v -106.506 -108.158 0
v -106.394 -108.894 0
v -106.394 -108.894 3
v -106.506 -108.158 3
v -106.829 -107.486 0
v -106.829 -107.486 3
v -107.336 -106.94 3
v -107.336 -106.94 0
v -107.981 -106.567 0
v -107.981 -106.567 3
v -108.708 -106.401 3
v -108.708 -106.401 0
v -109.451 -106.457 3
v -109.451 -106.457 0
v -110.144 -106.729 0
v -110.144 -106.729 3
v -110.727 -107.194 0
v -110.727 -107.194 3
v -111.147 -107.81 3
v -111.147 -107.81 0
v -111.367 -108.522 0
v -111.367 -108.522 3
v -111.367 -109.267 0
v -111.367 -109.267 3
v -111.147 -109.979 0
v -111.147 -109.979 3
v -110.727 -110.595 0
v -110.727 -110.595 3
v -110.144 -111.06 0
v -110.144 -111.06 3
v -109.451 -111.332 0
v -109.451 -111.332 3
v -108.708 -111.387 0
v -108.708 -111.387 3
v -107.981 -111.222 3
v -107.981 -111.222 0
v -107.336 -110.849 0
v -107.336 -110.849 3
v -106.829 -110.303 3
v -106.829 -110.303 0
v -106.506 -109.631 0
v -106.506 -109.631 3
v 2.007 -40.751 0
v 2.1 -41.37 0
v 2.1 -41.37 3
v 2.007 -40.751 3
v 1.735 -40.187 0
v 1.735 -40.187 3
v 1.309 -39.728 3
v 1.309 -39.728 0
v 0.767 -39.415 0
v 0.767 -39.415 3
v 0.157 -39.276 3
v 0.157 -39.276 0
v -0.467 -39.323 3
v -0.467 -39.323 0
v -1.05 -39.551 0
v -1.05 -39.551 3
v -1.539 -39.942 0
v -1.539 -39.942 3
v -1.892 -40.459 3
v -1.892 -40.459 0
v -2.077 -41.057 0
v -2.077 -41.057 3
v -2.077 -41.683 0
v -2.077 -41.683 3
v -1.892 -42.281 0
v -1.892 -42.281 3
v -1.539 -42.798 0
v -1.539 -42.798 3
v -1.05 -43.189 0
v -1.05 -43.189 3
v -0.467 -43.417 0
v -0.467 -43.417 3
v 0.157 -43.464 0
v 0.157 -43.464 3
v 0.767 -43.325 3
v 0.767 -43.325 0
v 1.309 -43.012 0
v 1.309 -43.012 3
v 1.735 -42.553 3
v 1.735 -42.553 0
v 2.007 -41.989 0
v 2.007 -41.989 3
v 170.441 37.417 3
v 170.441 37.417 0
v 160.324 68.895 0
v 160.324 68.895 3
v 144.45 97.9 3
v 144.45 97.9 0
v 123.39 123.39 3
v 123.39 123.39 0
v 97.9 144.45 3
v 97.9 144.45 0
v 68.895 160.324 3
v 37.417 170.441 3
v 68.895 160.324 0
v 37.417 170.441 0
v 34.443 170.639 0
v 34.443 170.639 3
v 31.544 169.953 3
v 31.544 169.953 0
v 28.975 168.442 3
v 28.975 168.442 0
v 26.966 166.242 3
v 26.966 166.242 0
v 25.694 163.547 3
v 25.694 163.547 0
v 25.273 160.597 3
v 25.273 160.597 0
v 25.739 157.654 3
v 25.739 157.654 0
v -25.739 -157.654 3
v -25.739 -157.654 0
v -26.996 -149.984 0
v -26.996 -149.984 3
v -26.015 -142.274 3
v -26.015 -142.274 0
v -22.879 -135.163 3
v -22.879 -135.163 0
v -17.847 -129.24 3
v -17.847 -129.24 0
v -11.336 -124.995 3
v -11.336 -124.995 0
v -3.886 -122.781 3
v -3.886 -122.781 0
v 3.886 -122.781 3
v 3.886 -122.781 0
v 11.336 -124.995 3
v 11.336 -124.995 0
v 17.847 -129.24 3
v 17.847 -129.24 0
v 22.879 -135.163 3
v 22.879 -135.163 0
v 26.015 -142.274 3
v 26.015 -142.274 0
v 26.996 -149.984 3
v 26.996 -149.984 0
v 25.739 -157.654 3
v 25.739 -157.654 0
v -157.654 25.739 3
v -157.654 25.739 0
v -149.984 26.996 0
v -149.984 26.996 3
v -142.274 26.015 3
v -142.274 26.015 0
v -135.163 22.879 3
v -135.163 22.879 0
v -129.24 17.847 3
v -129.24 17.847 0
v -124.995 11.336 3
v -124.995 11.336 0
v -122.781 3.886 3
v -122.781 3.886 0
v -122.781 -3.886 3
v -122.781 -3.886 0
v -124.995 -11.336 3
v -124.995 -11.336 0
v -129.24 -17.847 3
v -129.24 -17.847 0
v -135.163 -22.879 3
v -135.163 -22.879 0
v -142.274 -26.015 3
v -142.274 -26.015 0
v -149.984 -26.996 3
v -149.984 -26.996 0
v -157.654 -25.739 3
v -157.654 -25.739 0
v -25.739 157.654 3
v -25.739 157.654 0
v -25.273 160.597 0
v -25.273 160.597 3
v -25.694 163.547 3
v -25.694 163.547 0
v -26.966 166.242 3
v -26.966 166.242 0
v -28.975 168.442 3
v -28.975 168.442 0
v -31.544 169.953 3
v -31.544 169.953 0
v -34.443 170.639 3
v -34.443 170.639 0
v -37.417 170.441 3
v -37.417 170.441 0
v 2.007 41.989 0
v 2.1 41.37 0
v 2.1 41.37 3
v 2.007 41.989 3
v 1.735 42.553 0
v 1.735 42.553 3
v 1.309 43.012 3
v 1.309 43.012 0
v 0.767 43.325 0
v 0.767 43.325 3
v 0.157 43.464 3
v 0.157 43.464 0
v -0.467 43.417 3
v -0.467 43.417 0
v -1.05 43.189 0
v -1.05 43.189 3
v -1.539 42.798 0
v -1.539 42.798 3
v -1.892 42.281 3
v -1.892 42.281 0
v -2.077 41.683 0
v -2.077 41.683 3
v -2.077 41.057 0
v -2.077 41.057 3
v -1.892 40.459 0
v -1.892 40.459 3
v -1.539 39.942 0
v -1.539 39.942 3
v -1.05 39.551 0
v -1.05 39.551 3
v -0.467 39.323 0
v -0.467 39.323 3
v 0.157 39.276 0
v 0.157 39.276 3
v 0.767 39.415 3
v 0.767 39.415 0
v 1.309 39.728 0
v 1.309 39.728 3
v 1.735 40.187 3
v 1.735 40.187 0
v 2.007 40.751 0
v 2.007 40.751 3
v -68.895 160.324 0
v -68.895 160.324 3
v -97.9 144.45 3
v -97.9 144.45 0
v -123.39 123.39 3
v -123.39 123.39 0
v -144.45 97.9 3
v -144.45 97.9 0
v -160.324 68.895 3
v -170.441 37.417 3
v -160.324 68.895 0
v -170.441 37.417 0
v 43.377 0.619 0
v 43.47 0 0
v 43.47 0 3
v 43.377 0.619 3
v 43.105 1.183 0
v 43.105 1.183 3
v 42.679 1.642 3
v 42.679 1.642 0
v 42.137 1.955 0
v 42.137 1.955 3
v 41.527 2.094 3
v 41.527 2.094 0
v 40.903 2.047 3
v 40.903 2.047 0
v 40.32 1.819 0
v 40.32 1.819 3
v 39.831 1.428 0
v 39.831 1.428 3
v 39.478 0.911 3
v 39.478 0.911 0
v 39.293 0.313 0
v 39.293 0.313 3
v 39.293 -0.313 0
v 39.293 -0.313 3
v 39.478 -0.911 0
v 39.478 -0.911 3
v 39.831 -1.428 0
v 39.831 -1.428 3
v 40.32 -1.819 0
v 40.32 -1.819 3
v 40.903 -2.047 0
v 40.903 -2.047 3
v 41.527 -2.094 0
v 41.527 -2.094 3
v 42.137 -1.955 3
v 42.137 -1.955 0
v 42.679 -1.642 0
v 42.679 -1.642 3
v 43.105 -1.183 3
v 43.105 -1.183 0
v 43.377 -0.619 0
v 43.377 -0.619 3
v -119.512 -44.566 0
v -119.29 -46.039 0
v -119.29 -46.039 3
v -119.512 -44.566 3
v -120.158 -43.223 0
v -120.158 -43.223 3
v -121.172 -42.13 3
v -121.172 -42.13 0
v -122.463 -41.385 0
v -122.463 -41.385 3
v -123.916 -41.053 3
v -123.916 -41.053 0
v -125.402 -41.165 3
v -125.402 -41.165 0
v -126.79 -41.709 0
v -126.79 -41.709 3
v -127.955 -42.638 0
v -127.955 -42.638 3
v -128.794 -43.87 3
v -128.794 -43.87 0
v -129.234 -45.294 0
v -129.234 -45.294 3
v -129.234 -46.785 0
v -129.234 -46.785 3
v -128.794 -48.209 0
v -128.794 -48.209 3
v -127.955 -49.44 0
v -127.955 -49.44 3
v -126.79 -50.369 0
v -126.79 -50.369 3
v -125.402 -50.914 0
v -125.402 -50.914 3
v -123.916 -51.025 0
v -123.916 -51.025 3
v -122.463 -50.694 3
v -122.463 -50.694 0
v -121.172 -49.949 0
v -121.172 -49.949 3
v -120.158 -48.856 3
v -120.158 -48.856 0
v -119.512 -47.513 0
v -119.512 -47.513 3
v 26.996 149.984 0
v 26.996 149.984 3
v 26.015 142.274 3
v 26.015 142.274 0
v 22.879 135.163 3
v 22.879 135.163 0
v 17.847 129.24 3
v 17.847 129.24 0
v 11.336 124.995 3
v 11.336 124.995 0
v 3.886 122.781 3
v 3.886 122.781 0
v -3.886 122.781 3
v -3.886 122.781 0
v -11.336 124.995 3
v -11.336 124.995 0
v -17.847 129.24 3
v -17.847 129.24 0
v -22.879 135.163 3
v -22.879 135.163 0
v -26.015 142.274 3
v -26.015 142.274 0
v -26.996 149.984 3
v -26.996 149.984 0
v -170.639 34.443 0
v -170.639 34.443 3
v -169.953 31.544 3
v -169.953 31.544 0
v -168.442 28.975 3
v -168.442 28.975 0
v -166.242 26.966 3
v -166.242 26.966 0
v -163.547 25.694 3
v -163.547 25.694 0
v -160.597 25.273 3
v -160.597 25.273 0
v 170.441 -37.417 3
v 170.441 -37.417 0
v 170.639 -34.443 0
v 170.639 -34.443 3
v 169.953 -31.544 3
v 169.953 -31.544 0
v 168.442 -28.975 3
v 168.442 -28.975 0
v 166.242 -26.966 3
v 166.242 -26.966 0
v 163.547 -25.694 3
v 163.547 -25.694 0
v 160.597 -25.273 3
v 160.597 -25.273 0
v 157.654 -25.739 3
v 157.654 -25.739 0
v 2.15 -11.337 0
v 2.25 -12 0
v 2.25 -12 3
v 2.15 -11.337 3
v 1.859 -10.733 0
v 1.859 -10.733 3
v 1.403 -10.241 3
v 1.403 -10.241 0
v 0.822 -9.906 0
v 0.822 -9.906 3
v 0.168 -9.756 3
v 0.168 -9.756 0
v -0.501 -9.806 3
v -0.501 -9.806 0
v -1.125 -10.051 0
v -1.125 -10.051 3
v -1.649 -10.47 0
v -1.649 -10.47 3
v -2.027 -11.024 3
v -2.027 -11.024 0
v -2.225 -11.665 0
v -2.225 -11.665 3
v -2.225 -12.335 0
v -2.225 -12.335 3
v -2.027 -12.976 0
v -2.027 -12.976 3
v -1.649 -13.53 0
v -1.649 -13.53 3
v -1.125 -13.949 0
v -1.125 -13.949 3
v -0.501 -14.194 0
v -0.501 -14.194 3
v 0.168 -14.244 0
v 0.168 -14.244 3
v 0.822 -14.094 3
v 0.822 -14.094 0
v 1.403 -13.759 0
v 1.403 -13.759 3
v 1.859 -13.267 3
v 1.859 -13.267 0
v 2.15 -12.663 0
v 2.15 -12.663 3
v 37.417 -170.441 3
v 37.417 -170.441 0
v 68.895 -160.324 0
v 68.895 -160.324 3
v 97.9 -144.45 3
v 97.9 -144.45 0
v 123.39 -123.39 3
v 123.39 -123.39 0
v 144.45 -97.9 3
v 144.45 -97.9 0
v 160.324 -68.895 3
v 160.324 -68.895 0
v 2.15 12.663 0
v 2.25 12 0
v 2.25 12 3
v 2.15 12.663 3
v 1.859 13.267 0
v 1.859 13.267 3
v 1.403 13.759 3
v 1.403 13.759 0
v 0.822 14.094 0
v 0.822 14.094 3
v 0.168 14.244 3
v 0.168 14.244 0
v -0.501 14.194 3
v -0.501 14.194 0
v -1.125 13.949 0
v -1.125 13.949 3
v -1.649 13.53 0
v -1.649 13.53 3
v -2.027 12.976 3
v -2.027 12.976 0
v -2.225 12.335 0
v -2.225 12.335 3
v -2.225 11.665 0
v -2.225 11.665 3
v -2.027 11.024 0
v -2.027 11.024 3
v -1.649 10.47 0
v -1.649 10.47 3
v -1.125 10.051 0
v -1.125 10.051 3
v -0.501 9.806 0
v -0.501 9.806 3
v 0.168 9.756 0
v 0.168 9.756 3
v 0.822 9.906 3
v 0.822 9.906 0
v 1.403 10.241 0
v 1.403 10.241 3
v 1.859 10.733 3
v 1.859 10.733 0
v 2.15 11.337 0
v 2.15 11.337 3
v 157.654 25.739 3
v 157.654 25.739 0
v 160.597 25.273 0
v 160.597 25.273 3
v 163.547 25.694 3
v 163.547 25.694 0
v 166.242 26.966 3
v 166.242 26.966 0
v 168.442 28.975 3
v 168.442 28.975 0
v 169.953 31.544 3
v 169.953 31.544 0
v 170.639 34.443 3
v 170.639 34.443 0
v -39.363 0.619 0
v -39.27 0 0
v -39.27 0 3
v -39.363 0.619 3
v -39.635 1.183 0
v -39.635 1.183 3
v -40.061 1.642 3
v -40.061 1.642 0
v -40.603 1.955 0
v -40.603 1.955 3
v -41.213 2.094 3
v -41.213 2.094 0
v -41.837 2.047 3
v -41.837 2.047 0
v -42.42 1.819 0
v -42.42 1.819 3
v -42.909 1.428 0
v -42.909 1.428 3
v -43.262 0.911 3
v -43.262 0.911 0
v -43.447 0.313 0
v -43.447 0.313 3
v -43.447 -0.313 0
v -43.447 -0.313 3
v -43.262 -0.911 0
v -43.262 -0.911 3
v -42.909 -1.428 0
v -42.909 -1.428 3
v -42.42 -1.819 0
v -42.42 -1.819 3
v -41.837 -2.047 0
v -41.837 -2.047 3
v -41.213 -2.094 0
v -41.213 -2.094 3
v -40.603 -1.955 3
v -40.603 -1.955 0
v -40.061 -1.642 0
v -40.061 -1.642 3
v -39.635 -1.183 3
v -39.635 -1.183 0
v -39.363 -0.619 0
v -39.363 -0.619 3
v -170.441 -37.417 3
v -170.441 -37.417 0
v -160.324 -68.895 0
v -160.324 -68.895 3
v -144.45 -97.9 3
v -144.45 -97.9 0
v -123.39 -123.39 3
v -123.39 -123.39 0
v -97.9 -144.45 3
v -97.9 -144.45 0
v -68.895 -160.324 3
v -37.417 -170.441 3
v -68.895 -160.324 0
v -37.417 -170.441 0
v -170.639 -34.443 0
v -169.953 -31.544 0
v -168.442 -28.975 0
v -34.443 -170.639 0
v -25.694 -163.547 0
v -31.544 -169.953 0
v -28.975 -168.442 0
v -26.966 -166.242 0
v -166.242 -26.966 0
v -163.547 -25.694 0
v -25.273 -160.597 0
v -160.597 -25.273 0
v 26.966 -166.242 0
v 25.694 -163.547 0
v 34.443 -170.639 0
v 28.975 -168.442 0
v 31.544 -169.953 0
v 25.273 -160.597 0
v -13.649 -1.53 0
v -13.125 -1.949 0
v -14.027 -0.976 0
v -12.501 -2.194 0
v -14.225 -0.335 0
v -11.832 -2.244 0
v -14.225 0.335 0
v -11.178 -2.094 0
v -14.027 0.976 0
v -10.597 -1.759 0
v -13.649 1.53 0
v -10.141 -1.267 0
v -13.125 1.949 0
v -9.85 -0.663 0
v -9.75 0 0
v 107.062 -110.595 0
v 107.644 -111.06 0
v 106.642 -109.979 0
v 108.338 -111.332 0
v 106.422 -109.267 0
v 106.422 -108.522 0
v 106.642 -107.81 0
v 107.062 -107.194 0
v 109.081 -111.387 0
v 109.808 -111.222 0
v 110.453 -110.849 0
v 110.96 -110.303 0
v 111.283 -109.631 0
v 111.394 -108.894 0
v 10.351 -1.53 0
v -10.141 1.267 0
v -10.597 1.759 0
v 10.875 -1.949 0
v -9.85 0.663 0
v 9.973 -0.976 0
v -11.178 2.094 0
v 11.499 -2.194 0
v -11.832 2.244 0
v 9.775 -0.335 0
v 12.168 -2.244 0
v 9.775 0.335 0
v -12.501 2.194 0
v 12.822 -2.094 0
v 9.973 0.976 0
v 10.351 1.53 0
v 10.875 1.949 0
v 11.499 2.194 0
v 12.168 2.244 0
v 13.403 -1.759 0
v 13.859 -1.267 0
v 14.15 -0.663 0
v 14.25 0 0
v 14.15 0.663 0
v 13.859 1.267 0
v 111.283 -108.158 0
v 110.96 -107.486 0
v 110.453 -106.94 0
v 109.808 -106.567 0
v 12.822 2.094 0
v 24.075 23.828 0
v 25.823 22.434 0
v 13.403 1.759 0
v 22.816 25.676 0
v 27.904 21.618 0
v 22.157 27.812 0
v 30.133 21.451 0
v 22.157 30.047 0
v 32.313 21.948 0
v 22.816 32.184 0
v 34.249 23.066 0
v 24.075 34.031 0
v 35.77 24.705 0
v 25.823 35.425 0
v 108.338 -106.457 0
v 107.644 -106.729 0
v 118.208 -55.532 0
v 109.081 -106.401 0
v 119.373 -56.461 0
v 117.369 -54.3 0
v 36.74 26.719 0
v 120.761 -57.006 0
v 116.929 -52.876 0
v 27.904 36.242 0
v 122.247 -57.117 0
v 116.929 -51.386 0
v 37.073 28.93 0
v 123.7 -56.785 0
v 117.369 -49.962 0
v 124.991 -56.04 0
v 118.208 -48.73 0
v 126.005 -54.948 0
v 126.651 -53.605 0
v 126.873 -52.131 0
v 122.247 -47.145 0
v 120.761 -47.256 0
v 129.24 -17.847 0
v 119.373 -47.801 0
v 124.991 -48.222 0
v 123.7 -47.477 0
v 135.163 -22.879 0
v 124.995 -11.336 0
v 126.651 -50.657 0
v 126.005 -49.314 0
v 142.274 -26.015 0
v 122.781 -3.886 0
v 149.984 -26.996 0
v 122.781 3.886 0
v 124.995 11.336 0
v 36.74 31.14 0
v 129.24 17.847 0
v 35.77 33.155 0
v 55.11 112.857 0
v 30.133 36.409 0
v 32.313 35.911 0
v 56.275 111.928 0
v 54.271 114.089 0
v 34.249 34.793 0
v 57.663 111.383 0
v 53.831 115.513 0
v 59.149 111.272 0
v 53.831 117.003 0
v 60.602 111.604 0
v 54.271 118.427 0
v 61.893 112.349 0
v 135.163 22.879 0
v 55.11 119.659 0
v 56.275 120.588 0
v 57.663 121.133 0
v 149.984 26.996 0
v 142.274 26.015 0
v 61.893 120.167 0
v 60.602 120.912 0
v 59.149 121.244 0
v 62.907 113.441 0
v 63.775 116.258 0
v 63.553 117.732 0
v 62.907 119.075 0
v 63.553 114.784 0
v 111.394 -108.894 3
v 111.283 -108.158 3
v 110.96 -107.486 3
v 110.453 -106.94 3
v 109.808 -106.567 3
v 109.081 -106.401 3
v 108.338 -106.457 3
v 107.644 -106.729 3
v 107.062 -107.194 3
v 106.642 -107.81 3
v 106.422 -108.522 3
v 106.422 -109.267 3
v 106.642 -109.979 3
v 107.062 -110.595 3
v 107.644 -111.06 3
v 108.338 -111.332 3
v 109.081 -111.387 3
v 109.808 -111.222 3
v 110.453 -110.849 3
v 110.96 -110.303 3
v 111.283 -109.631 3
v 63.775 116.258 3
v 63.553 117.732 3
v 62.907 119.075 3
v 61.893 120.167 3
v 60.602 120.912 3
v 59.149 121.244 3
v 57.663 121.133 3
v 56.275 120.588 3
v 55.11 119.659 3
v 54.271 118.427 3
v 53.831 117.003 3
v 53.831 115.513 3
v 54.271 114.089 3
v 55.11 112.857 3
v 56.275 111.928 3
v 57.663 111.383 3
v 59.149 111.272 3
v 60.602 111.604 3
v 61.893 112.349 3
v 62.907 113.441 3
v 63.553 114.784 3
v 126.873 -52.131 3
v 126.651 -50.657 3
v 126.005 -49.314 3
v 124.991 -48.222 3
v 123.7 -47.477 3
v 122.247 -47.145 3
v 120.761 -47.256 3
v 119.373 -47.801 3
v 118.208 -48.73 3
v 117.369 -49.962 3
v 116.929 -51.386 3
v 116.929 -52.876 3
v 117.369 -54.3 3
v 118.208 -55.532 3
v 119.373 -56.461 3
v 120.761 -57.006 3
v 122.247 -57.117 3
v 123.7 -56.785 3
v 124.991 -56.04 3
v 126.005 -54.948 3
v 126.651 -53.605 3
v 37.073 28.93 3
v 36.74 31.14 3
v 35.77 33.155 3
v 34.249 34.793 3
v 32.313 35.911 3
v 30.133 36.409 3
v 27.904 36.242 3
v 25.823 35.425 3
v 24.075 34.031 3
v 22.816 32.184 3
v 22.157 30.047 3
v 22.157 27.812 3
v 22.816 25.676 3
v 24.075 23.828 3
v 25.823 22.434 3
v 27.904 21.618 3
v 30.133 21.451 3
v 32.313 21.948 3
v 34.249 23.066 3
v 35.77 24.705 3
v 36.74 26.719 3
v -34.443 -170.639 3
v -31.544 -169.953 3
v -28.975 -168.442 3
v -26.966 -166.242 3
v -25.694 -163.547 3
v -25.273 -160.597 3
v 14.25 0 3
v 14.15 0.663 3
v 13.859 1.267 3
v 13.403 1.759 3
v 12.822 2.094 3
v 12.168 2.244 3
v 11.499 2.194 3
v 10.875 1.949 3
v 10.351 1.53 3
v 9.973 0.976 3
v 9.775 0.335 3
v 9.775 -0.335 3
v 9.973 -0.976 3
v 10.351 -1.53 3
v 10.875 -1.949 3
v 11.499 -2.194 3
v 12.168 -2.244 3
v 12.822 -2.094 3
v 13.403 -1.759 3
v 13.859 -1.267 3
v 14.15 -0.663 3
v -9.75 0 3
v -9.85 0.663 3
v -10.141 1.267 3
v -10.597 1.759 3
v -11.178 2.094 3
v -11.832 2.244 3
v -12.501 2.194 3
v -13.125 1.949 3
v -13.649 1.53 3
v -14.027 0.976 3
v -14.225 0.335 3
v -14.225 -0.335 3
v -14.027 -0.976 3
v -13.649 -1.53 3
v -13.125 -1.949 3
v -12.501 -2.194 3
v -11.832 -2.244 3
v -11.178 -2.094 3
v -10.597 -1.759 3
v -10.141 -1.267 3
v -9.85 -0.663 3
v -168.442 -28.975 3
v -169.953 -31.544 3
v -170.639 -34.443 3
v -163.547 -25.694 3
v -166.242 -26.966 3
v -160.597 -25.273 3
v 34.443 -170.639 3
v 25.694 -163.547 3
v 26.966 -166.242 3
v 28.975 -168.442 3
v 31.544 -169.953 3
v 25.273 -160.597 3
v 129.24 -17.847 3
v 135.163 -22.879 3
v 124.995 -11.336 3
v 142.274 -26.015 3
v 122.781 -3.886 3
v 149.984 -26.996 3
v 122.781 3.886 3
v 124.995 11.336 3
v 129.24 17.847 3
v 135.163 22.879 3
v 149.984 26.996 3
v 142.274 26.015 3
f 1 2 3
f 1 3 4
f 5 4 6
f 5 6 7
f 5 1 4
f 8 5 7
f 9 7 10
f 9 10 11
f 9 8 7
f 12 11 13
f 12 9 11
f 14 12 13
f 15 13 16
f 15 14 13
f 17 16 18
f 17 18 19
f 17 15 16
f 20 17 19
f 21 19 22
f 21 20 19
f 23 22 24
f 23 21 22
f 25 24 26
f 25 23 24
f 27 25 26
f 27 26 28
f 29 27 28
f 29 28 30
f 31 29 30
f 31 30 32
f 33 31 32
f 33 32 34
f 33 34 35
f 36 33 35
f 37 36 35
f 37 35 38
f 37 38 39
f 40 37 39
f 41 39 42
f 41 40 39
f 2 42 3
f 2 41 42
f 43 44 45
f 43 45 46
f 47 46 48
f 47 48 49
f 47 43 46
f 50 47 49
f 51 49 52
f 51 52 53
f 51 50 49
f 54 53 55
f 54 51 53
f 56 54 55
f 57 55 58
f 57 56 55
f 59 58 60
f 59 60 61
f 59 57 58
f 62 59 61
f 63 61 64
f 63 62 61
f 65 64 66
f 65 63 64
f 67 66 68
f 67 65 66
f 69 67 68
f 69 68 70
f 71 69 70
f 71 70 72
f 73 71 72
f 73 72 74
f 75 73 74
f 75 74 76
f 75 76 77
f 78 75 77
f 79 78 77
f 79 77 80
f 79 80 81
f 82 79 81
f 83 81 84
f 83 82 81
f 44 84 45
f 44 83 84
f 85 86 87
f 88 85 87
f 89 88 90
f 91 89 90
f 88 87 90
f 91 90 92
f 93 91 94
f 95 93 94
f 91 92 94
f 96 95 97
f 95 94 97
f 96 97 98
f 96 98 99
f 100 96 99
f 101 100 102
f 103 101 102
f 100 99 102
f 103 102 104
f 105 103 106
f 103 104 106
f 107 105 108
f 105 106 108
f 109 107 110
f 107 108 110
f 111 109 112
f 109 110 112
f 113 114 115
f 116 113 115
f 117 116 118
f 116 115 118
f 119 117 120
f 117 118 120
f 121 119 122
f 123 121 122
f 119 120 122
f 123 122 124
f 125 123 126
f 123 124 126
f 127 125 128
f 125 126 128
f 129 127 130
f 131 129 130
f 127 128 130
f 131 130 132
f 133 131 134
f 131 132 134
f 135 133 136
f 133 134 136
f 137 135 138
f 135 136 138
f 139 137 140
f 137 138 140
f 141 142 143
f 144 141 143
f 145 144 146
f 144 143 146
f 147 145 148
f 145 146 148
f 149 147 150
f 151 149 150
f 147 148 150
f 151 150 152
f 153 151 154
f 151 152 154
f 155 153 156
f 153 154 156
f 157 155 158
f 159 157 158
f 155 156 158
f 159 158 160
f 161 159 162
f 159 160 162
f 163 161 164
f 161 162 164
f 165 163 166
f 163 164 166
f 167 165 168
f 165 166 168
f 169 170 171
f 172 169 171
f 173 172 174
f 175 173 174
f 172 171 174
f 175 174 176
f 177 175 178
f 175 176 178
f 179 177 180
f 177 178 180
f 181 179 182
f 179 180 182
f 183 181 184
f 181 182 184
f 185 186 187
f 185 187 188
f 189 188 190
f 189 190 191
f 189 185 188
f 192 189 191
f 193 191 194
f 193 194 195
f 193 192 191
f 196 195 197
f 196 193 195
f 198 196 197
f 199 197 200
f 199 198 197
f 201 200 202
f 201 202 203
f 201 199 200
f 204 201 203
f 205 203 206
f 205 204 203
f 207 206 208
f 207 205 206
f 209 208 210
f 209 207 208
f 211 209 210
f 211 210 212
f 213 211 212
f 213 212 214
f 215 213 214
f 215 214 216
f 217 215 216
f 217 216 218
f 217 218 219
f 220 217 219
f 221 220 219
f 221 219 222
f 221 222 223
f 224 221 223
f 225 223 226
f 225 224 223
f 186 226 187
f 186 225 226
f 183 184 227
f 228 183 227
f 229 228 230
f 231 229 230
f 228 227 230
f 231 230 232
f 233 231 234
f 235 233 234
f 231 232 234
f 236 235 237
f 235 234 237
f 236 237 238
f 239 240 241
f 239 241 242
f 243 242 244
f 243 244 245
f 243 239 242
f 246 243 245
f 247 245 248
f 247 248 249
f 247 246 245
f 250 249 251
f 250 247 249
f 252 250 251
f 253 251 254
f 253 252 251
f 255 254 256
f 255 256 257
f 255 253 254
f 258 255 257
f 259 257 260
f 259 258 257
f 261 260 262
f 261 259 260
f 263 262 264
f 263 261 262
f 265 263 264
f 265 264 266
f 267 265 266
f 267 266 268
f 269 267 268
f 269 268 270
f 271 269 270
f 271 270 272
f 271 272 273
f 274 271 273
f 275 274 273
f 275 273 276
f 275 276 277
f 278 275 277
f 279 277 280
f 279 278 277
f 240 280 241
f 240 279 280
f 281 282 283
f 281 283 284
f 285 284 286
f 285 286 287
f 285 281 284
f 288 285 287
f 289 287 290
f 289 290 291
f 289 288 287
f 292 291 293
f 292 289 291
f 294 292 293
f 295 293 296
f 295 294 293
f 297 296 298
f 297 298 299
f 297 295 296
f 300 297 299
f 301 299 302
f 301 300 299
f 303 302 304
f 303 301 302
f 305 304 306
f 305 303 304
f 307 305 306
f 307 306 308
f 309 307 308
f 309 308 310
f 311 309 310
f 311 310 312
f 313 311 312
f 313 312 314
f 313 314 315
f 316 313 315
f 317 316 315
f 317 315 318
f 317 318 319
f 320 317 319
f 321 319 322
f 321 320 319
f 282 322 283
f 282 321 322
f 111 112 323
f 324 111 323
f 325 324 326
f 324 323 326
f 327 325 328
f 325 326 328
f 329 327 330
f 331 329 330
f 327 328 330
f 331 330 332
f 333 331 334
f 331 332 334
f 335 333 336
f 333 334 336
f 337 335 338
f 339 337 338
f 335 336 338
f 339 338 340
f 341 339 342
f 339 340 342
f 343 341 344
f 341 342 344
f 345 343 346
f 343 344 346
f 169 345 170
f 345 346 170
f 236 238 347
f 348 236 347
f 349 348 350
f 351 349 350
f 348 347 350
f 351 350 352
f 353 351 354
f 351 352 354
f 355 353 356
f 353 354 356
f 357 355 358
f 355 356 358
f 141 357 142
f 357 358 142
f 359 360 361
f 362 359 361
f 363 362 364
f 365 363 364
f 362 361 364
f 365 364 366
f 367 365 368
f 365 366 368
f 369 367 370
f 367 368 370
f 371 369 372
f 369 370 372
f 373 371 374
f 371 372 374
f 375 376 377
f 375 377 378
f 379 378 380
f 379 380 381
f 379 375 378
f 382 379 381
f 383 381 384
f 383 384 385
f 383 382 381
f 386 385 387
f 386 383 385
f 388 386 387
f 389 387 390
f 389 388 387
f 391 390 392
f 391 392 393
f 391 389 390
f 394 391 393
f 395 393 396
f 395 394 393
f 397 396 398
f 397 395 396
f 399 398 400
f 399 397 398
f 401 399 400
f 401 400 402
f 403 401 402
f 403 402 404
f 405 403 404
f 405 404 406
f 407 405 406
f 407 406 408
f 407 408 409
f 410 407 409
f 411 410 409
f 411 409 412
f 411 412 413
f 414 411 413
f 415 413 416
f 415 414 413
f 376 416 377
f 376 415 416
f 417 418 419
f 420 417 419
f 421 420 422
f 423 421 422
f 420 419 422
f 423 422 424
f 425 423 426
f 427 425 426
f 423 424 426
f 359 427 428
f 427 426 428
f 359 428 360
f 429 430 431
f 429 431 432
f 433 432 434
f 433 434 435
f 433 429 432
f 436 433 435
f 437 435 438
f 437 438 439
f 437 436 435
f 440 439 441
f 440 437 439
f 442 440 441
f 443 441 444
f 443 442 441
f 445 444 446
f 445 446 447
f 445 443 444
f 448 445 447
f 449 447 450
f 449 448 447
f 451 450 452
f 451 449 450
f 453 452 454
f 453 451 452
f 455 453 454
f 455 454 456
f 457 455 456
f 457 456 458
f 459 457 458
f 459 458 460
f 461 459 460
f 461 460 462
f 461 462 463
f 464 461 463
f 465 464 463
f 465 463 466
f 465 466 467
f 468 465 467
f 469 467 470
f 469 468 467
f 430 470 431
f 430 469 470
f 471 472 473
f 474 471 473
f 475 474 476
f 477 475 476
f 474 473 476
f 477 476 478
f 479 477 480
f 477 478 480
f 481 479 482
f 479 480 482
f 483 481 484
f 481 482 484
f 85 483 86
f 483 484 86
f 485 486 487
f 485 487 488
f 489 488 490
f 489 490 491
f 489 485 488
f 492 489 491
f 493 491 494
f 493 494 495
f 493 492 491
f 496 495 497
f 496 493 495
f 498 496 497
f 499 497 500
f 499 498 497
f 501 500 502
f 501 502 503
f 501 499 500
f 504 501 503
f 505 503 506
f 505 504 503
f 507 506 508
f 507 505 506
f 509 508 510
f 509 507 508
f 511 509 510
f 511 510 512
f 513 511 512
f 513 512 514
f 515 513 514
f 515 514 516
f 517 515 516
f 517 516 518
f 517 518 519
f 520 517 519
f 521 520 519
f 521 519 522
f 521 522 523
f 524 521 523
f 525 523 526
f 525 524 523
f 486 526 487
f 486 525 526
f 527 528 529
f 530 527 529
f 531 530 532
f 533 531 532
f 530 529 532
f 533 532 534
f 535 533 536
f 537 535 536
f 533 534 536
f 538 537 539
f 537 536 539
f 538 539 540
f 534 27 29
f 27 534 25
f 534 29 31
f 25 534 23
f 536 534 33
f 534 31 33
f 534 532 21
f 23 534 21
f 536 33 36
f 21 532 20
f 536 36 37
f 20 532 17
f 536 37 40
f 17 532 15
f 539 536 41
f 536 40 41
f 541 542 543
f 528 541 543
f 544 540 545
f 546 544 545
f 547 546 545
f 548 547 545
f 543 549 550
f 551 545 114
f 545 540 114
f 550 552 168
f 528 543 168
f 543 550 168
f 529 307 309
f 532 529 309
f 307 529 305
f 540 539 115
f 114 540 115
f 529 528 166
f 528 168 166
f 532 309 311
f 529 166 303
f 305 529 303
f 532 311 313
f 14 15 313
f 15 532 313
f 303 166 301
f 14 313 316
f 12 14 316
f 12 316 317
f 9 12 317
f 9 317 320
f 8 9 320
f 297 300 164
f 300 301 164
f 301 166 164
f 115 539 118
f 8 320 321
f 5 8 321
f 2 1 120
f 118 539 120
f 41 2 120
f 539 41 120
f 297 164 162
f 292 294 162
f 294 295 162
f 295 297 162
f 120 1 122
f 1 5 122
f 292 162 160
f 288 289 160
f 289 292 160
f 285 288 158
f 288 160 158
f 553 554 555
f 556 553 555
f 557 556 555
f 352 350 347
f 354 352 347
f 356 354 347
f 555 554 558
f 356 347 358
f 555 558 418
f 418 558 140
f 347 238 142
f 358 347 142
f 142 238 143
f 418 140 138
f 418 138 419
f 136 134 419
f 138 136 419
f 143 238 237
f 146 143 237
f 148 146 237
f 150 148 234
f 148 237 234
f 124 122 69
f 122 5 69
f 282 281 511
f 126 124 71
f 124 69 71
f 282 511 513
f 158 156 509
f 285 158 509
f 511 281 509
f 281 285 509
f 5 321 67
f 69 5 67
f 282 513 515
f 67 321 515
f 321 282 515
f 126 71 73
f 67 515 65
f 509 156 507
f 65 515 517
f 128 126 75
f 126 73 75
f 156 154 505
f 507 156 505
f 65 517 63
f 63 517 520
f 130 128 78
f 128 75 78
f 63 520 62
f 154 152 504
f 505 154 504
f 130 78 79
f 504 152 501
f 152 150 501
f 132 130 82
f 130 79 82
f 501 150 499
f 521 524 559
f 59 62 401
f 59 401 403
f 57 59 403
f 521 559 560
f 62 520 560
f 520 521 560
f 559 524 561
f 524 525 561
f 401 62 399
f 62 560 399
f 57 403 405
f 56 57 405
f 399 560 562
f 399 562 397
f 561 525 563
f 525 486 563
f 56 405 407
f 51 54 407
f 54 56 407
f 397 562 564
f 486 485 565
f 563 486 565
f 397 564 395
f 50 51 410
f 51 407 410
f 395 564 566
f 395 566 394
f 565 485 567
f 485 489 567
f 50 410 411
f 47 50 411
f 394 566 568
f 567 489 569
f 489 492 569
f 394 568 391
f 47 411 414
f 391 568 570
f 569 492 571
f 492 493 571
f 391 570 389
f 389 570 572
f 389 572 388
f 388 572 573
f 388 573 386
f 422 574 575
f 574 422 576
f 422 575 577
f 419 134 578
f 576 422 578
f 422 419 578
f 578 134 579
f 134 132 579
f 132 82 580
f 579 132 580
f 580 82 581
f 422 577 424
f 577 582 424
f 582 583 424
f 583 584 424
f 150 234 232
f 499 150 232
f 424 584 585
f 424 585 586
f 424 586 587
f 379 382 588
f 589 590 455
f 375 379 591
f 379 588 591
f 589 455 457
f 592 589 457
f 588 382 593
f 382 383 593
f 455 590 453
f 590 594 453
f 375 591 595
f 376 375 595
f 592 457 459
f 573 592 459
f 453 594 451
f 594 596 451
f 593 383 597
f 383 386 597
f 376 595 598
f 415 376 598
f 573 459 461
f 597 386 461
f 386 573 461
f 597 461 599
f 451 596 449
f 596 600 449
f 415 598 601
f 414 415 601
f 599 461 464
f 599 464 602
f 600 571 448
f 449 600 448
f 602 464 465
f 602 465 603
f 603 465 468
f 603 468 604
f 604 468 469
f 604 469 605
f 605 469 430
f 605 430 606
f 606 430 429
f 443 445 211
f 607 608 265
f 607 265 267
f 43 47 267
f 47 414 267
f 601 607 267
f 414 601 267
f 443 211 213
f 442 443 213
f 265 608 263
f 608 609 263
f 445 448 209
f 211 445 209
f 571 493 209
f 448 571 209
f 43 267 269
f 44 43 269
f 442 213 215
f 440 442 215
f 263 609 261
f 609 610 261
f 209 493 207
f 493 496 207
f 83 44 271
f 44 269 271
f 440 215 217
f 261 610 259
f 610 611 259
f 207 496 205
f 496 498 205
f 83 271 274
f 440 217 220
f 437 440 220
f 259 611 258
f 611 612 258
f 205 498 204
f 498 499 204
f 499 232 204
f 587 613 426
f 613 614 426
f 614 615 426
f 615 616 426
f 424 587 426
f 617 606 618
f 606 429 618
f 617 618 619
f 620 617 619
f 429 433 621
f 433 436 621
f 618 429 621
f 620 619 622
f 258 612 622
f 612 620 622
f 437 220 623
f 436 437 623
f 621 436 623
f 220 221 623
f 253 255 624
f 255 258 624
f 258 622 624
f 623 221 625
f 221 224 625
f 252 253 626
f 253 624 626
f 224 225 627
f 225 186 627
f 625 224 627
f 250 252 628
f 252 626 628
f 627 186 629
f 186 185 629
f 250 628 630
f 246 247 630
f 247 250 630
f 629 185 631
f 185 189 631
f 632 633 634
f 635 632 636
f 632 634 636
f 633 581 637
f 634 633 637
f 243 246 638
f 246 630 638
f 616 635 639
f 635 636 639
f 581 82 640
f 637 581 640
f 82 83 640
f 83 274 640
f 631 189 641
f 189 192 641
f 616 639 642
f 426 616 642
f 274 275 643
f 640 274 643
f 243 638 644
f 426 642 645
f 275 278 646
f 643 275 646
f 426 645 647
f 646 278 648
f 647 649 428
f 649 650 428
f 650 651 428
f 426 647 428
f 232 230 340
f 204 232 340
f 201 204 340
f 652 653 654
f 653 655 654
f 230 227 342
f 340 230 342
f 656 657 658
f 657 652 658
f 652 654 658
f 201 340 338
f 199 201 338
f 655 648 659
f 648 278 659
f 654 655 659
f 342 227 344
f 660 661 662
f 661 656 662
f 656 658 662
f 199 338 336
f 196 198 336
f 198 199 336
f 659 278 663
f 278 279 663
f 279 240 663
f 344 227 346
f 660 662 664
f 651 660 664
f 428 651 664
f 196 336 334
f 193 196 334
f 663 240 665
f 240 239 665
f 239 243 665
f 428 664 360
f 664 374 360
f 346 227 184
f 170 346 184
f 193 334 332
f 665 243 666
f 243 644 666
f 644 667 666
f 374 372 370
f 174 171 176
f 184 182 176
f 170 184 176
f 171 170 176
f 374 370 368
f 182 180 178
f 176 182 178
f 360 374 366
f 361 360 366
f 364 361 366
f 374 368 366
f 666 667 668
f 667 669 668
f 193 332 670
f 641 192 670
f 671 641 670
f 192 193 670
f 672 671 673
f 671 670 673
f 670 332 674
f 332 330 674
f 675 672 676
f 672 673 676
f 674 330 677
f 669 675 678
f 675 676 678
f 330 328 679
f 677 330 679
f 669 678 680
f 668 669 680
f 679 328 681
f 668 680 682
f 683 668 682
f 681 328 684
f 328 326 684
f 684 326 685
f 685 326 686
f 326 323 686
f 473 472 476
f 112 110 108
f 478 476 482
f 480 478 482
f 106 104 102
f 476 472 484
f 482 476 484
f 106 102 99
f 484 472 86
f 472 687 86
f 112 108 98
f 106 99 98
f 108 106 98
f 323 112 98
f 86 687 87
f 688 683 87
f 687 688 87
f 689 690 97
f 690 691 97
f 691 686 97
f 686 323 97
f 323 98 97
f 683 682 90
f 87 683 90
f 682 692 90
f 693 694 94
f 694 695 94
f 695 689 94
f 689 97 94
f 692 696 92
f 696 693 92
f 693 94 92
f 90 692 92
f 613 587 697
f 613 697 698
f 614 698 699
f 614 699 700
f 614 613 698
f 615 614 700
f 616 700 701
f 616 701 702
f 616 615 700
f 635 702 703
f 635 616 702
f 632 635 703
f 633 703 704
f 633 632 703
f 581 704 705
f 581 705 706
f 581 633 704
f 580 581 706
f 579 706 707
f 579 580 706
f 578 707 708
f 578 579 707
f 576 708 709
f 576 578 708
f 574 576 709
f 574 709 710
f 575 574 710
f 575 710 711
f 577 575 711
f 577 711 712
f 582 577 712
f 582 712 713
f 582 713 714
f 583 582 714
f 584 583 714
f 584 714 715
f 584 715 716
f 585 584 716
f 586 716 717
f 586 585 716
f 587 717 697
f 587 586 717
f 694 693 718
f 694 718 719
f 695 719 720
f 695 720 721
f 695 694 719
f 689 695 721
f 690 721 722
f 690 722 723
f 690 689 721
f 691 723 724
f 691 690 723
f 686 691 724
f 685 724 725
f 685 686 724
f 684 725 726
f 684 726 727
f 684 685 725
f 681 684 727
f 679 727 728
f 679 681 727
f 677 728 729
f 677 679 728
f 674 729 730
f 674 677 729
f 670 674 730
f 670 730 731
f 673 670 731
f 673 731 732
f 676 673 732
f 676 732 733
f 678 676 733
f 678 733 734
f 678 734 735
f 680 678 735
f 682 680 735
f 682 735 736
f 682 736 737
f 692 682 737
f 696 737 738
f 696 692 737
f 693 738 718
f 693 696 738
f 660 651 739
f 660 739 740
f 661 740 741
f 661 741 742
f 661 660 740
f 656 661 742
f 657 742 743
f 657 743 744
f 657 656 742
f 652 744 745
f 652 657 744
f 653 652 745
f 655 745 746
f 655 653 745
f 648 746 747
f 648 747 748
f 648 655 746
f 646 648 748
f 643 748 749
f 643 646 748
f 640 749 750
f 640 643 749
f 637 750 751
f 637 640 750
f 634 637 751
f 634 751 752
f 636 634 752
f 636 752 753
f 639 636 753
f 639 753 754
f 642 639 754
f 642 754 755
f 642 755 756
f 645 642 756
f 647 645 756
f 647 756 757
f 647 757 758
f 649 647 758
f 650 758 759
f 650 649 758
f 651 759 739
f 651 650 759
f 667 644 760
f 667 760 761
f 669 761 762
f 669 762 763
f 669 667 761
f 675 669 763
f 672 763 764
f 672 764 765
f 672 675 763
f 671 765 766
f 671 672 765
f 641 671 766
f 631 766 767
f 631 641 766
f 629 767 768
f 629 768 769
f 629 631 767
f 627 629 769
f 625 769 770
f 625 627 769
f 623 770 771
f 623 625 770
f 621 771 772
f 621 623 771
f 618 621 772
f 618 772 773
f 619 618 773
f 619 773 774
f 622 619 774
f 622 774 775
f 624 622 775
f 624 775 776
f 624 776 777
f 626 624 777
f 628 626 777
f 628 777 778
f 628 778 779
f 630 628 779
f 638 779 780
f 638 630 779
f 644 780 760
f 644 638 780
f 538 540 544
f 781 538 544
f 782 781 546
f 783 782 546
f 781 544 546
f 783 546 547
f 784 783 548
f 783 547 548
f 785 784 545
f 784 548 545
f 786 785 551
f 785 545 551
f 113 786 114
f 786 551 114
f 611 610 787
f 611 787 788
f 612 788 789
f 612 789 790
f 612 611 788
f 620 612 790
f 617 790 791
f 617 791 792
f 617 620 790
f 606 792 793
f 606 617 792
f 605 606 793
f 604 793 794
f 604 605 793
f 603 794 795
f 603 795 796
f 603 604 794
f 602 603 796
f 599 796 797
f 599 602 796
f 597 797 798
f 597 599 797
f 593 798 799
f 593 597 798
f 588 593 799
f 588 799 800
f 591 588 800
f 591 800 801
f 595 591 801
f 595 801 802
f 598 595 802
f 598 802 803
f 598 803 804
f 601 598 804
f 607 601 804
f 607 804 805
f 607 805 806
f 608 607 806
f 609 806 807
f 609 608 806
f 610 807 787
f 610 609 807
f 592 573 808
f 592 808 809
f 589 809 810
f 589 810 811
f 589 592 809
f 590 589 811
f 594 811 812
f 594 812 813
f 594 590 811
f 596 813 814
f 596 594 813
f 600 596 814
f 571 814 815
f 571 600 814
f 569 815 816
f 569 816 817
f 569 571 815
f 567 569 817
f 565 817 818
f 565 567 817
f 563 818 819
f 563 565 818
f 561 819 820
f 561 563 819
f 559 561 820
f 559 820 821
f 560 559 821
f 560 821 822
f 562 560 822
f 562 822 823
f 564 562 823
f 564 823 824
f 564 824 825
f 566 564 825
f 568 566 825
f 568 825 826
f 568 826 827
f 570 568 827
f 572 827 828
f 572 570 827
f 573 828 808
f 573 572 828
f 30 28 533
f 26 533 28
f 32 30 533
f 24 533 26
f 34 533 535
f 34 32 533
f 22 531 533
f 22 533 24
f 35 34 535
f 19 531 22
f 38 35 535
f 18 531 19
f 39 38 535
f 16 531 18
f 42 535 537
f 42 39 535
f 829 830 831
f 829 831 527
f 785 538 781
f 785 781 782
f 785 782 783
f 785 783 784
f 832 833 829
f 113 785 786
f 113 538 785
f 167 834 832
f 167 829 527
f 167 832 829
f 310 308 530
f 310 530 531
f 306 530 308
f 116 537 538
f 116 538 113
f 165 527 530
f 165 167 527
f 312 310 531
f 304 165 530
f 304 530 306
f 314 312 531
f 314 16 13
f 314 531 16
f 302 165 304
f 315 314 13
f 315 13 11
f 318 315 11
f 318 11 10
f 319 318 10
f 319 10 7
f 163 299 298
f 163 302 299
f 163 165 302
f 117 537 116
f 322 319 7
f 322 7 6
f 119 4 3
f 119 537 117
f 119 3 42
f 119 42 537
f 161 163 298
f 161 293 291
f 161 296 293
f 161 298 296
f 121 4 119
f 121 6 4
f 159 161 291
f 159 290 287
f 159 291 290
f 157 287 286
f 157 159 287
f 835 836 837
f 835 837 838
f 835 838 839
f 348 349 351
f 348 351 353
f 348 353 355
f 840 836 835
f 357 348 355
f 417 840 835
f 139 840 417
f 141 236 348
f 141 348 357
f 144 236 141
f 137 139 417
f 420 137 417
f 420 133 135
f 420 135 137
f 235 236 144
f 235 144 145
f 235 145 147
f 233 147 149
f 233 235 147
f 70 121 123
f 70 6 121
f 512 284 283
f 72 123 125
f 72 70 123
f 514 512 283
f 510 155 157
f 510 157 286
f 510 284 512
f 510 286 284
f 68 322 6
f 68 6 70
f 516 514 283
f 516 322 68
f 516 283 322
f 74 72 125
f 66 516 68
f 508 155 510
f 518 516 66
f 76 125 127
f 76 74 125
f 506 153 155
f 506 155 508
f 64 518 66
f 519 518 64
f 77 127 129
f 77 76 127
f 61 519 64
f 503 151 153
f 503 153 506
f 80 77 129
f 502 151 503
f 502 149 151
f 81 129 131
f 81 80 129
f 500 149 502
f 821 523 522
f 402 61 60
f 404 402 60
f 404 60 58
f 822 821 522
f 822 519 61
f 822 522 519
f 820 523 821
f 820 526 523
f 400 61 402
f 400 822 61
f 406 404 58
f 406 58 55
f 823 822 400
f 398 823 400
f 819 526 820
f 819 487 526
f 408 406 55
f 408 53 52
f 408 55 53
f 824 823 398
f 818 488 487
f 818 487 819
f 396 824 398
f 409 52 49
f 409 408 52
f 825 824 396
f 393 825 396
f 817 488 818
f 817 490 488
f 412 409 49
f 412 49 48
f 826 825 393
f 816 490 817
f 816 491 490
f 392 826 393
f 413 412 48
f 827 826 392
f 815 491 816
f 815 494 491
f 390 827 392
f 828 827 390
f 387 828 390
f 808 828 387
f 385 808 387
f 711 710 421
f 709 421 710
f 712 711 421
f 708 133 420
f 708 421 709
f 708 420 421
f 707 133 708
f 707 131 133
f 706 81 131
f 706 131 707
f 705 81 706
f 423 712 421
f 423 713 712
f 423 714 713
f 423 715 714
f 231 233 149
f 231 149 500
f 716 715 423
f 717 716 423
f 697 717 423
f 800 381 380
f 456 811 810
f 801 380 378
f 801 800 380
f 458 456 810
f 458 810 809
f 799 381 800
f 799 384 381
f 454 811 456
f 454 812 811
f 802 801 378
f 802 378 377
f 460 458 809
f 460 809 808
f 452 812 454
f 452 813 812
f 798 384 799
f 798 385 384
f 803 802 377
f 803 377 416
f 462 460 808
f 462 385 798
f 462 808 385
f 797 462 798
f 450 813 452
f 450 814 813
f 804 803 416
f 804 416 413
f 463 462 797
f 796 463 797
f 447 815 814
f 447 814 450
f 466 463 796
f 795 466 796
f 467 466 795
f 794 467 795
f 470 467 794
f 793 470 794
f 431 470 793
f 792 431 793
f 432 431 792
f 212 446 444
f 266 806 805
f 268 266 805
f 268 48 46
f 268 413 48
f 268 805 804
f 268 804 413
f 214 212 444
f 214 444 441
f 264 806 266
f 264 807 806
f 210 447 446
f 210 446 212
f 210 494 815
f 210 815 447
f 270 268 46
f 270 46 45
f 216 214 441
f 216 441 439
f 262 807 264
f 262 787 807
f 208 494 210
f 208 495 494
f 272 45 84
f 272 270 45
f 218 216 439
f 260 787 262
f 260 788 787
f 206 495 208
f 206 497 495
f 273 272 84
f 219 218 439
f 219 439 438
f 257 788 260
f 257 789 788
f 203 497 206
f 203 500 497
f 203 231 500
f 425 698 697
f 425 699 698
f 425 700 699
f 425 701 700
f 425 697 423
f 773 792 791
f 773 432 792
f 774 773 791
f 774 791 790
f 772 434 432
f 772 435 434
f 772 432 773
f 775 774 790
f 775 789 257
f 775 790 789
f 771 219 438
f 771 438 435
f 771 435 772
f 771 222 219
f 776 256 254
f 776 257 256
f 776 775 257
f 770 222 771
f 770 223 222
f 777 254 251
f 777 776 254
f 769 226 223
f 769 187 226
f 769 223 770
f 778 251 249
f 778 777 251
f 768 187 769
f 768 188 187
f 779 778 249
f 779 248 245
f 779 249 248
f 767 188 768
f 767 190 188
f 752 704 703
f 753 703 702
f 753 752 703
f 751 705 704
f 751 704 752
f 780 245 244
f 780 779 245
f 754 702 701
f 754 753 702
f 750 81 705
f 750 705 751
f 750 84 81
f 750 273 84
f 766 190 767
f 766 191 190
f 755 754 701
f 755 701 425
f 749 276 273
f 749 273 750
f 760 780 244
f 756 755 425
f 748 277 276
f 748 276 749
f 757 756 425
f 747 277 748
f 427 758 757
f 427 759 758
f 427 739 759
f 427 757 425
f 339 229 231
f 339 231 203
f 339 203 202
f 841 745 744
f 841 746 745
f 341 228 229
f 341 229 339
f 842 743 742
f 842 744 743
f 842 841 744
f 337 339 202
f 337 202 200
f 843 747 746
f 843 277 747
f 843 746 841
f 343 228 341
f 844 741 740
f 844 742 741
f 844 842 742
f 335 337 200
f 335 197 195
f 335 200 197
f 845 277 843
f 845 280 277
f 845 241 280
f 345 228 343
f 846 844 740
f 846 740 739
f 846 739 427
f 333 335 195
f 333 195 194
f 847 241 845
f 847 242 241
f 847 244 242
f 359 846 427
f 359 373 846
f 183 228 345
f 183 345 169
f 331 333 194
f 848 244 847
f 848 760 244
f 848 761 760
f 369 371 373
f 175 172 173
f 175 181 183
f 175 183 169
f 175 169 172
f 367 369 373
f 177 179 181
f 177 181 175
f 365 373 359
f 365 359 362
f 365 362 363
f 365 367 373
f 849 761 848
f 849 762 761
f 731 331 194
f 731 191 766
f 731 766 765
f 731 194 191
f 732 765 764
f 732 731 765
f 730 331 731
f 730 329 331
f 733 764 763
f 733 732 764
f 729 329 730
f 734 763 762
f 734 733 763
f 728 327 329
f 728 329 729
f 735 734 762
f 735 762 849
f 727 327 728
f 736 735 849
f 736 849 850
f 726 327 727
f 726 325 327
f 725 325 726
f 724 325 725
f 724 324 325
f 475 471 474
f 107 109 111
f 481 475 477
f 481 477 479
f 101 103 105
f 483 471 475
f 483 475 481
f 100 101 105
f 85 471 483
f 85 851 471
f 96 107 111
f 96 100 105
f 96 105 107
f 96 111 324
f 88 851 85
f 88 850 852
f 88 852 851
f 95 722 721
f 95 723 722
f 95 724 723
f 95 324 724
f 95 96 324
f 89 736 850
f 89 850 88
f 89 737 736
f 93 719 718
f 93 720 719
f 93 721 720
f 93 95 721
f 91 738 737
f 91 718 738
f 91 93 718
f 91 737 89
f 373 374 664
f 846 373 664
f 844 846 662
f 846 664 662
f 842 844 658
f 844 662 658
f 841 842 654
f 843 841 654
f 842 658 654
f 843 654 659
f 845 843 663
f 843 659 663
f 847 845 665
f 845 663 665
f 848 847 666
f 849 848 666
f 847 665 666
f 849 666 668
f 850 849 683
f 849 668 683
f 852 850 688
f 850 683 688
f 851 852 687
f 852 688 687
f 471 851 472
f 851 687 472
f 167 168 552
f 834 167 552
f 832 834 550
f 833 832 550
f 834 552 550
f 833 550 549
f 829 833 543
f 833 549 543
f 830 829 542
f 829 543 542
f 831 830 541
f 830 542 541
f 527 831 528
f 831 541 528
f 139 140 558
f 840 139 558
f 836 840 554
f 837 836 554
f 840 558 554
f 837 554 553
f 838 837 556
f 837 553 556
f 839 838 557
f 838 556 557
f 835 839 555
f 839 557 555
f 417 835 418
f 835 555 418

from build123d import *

# Parameters (mm, degrees)
SKETCH1_R           = 2.5
SKETCH1_R_2         = 5
SKETCH1_R_3         = 2.1
SKETCH1_R_4         = 2.25
SKETCH1_R_5         = 7.5
BOSS_EXTRUDE2_DEPTH = 3


with BuildPart() as part:
    # Sketch1 → Boss-Extrude2 (new body)
    with BuildSketch(Plane.XY):
        with BuildLine():
            ThreePointArc((-157.653936545, -25.739334079), (-167.417194297, -27.888102395), (-170.441324171, -37.416640882))
            ThreePointArc((-170.441324171, -37.416640882), (-123.390133317, -123.390133317), (-37.416640882, -170.441324171))
            ThreePointArc((-37.416640882, -170.441324171), (-27.888102395, -167.417194297), (-25.739334079, -157.653936545))
            ThreePointArc((-25.739334079, -157.653936545), (0, -122.5), (25.739334079, -157.653936545))
            ThreePointArc((25.739334079, -157.653936545), (27.888102395, -167.417194297), (37.416640882, -170.441324171))
            ThreePointArc((37.416640882, -170.441324171), (123.390133317, -123.390133317), (170.441324171, -37.416640882))
            ThreePointArc((170.441324171, -37.416640882), (167.417194297, -27.888102395), (157.653936545, -25.739334079))
            ThreePointArc((157.653936545, -25.739334079), (122.5, 0), (157.653936545, 25.739334079))
            ThreePointArc((157.653936545, 25.739334079), (167.417194297, 27.888102395), (170.441324171, 37.416640882))
            ThreePointArc((170.441324171, 37.416640882), (123.390133317, 123.390133317), (37.416640882, 170.441324171))
            ThreePointArc((37.416640882, 170.441324171), (27.888102395, 167.417194297), (25.739334079, 157.653936545))
            ThreePointArc((25.739334079, 157.653936545), (0, 122.5), (-25.739334079, 157.653936545))
            ThreePointArc((-25.739334079, 157.653936545), (-27.888102395, 167.417194297), (-37.416640882, 170.441324171))
            ThreePointArc((-37.416640882, 170.441324171), (-123.390133317, 123.390133317), (-170.441324171, 37.416640882))
            ThreePointArc((-170.441324171, 37.416640882), (-167.417194297, 27.888102395), (-157.653936545, 25.739334079))
            ThreePointArc((-157.653936545, 25.739334079), (-122.5, 0), (-157.653936545, -25.739334079))
        make_face()
        with Locations((-108.894444303, -108.894444303)):
            Circle(SKETCH1_R, mode=Mode.SUBTRACT)
        with Locations((-124.289525039, -46.039349088)):
            Circle(SKETCH1_R_2, mode=Mode.SUBTRACT)
        with Locations((0, -41.37)):
            Circle(SKETCH1_R_3, mode=Mode.SUBTRACT)
        with Locations((108.894444303, -108.894444303)):
            Circle(SKETCH1_R, mode=Mode.SUBTRACT)
        with Locations((0, -12)):
            Circle(SKETCH1_R_4, mode=Mode.SUBTRACT)
        with Locations((121.873399663, -52.131018514)):
            Circle(SKETCH1_R_2, mode=Mode.SUBTRACT)
        with Locations((-41.37, 0)):
            Circle(SKETCH1_R_3, mode=Mode.SUBTRACT)
        with Locations((-12, 0)):
            Circle(SKETCH1_R_4, mode=Mode.SUBTRACT)
        with Locations((12, 0)):
            Circle(SKETCH1_R_4, mode=Mode.SUBTRACT)
        with Locations((0, 12)):
            Circle(SKETCH1_R_4, mode=Mode.SUBTRACT)
        with Locations((41.37, 0)):
            Circle(SKETCH1_R_3, mode=Mode.SUBTRACT)
        with Locations((0, 41.37)):
            Circle(SKETCH1_R_3, mode=Mode.SUBTRACT)
        with Locations((29.572812598, 28.929667386)):
            Circle(SKETCH1_R_5, mode=Mode.SUBTRACT)
        with Locations((58.775444452, 116.257983948)):
            Circle(SKETCH1_R_2, mode=Mode.SUBTRACT)
    extrude(amount=BOSS_EXTRUDE2_DEPTH)


solid = part.part
